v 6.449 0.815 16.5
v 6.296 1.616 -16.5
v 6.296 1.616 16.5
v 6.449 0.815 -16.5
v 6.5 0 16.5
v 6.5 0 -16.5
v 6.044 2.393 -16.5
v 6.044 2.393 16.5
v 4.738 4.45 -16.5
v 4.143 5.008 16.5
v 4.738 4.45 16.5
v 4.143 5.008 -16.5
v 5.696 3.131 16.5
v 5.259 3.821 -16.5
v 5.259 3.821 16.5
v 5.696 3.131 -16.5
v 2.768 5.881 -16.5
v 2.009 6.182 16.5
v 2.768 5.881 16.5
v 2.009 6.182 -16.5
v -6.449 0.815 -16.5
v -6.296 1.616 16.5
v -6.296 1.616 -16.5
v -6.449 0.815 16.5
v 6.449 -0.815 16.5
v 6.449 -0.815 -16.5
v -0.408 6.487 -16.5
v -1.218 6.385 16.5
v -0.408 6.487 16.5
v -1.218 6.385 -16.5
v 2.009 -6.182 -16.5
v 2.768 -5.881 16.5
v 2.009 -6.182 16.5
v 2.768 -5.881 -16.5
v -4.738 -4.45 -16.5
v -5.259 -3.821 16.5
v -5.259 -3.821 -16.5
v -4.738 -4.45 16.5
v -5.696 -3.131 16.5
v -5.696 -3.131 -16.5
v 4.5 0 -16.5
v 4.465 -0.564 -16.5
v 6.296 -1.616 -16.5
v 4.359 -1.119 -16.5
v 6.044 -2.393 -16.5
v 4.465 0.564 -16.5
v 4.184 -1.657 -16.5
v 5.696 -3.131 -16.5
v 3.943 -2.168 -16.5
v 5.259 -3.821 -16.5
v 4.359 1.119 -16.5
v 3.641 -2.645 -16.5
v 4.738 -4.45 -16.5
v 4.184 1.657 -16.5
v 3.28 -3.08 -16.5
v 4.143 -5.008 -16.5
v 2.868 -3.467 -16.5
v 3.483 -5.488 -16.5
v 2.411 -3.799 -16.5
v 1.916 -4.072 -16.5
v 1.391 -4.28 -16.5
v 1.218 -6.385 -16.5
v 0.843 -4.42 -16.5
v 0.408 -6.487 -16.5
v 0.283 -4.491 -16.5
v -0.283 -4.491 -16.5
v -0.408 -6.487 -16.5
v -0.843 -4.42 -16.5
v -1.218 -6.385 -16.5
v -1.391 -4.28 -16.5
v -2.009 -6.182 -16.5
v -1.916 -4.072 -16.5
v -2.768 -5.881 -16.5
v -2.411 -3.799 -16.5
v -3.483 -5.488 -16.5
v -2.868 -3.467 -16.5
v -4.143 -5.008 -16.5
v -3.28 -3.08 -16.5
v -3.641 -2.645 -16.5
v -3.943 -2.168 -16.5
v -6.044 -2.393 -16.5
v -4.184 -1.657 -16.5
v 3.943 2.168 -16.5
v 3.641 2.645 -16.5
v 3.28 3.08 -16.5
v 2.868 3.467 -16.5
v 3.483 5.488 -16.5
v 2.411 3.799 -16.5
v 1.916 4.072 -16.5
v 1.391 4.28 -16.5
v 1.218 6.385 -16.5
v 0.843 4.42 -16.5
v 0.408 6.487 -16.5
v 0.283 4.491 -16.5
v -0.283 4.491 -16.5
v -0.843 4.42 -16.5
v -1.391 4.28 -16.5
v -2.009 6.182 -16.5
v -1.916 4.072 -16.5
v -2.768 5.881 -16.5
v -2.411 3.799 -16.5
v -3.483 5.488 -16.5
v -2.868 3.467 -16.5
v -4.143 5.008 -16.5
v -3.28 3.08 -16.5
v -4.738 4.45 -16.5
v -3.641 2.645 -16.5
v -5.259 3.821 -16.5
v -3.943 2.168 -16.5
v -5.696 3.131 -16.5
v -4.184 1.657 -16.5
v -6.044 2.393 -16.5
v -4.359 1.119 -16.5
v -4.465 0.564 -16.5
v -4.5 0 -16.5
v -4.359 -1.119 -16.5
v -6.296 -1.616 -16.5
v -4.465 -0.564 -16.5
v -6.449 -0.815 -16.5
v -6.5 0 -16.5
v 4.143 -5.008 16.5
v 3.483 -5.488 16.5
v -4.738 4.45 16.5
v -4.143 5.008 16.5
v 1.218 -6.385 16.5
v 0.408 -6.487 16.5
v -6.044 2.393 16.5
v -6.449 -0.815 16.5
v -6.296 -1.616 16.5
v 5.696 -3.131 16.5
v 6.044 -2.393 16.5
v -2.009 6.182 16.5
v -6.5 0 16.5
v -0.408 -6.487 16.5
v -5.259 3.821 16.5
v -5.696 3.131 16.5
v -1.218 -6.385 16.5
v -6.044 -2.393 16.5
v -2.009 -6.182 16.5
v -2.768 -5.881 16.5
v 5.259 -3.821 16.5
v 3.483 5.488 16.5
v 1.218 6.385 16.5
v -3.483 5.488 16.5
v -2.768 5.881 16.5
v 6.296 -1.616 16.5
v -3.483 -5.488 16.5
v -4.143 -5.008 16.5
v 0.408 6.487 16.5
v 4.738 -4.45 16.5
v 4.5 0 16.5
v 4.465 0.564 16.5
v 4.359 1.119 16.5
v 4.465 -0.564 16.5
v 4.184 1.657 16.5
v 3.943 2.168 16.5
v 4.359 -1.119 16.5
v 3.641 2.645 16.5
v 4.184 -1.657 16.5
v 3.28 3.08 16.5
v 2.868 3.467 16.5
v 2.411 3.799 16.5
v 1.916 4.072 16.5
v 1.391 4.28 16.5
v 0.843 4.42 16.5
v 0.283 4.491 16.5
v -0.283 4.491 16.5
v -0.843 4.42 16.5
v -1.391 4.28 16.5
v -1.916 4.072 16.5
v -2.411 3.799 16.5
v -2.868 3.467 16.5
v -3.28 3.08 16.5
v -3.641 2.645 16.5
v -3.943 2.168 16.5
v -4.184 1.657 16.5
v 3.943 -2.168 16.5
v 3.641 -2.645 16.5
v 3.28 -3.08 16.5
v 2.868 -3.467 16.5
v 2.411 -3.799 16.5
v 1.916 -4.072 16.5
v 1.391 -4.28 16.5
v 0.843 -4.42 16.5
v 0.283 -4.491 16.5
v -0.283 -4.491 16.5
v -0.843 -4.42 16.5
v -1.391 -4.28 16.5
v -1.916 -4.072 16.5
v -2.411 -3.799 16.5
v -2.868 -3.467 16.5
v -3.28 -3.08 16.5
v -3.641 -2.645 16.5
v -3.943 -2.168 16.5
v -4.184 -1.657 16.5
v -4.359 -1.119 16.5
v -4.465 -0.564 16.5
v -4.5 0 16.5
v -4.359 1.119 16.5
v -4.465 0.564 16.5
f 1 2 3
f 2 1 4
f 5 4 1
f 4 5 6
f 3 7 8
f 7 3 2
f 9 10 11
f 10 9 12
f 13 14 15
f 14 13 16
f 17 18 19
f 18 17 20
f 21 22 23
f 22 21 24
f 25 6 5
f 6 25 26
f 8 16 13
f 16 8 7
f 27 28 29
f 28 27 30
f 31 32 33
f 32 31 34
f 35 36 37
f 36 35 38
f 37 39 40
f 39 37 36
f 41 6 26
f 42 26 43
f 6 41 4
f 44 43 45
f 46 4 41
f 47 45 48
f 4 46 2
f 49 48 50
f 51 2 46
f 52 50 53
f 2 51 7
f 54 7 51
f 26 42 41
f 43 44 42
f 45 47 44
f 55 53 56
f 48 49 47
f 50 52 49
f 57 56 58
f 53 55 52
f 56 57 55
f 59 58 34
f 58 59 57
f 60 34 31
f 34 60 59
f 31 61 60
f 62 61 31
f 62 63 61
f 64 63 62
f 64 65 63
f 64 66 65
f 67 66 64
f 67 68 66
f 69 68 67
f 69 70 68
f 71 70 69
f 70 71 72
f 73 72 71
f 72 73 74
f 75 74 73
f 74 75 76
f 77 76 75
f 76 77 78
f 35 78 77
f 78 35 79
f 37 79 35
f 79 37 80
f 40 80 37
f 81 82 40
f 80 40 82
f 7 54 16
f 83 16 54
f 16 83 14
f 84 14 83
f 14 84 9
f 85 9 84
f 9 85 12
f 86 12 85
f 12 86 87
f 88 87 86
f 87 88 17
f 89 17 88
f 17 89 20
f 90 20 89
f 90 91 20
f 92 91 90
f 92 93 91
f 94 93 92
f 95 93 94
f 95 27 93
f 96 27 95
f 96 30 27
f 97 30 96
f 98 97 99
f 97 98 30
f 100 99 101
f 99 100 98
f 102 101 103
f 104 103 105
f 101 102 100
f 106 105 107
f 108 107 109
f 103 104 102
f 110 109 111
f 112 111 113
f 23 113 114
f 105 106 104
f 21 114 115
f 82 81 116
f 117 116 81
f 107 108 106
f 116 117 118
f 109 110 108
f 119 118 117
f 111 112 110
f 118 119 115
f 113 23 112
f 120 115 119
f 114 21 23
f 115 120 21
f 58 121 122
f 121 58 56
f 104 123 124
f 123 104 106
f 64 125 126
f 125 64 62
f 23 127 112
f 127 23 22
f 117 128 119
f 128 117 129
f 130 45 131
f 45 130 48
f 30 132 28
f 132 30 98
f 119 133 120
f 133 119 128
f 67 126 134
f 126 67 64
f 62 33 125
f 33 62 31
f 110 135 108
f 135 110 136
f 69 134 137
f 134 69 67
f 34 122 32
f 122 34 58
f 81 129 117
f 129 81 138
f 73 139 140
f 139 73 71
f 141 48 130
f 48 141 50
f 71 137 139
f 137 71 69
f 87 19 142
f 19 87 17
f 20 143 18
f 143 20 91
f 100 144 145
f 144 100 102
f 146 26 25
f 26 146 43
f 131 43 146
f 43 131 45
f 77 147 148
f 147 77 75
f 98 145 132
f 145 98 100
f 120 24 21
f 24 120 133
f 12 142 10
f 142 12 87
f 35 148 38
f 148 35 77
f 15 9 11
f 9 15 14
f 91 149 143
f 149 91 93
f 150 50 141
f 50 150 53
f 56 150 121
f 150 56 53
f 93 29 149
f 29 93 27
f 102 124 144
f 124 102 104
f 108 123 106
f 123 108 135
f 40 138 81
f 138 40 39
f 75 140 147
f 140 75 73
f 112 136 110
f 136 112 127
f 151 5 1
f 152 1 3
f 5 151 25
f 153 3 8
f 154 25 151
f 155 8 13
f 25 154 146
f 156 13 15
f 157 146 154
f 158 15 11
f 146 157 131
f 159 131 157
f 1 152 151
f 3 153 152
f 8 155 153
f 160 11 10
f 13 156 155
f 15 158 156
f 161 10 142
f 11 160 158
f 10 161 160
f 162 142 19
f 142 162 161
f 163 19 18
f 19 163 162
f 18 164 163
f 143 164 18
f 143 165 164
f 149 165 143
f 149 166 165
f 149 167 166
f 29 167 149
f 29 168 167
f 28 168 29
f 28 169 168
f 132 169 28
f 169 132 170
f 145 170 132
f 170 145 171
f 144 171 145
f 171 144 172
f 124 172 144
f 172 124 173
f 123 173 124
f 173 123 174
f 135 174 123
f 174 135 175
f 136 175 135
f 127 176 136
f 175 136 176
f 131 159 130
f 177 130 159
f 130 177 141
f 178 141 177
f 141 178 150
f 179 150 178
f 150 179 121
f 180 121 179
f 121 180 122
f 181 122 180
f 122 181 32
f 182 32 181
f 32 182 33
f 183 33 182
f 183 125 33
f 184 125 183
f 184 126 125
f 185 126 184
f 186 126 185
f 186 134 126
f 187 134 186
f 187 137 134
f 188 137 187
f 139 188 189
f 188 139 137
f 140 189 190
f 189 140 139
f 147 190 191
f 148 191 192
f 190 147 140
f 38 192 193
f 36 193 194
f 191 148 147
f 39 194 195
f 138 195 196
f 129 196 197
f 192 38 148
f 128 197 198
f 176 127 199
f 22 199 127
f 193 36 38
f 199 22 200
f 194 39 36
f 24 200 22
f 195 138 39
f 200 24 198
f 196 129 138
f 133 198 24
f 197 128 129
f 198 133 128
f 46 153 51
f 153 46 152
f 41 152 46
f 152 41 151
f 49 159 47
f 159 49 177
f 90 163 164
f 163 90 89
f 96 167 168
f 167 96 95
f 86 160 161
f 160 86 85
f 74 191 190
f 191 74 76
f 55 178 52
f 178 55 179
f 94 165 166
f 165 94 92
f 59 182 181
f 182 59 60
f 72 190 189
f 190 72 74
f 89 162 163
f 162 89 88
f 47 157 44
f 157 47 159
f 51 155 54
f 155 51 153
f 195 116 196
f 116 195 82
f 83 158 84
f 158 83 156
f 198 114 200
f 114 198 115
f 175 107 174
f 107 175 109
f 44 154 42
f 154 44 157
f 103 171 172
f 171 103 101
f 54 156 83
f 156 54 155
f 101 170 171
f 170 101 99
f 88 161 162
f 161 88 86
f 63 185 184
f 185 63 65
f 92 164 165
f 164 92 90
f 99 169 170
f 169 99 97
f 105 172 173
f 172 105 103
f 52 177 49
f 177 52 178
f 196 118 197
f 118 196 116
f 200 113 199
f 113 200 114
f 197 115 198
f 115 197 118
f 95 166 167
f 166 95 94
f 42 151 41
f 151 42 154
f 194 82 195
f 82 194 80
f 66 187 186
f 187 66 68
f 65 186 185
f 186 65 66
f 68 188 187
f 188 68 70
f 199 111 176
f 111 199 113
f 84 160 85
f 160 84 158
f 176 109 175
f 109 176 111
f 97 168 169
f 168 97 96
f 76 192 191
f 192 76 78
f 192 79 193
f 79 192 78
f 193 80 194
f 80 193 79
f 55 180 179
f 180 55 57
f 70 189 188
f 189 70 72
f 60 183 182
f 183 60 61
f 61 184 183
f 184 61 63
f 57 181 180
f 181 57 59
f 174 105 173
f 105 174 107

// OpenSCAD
$fn = 50;


difference() {
	union() {
		translate(v = [0, 0, -16.5000000000]) {
			cylinder(h = 33, r = 6.5000000000);
		}
	}
	union() {
		translate(v = [0, 0, -100.0000000000]) {
			cylinder(h = 200, r = 4.5000000000);
		}
	}
}
